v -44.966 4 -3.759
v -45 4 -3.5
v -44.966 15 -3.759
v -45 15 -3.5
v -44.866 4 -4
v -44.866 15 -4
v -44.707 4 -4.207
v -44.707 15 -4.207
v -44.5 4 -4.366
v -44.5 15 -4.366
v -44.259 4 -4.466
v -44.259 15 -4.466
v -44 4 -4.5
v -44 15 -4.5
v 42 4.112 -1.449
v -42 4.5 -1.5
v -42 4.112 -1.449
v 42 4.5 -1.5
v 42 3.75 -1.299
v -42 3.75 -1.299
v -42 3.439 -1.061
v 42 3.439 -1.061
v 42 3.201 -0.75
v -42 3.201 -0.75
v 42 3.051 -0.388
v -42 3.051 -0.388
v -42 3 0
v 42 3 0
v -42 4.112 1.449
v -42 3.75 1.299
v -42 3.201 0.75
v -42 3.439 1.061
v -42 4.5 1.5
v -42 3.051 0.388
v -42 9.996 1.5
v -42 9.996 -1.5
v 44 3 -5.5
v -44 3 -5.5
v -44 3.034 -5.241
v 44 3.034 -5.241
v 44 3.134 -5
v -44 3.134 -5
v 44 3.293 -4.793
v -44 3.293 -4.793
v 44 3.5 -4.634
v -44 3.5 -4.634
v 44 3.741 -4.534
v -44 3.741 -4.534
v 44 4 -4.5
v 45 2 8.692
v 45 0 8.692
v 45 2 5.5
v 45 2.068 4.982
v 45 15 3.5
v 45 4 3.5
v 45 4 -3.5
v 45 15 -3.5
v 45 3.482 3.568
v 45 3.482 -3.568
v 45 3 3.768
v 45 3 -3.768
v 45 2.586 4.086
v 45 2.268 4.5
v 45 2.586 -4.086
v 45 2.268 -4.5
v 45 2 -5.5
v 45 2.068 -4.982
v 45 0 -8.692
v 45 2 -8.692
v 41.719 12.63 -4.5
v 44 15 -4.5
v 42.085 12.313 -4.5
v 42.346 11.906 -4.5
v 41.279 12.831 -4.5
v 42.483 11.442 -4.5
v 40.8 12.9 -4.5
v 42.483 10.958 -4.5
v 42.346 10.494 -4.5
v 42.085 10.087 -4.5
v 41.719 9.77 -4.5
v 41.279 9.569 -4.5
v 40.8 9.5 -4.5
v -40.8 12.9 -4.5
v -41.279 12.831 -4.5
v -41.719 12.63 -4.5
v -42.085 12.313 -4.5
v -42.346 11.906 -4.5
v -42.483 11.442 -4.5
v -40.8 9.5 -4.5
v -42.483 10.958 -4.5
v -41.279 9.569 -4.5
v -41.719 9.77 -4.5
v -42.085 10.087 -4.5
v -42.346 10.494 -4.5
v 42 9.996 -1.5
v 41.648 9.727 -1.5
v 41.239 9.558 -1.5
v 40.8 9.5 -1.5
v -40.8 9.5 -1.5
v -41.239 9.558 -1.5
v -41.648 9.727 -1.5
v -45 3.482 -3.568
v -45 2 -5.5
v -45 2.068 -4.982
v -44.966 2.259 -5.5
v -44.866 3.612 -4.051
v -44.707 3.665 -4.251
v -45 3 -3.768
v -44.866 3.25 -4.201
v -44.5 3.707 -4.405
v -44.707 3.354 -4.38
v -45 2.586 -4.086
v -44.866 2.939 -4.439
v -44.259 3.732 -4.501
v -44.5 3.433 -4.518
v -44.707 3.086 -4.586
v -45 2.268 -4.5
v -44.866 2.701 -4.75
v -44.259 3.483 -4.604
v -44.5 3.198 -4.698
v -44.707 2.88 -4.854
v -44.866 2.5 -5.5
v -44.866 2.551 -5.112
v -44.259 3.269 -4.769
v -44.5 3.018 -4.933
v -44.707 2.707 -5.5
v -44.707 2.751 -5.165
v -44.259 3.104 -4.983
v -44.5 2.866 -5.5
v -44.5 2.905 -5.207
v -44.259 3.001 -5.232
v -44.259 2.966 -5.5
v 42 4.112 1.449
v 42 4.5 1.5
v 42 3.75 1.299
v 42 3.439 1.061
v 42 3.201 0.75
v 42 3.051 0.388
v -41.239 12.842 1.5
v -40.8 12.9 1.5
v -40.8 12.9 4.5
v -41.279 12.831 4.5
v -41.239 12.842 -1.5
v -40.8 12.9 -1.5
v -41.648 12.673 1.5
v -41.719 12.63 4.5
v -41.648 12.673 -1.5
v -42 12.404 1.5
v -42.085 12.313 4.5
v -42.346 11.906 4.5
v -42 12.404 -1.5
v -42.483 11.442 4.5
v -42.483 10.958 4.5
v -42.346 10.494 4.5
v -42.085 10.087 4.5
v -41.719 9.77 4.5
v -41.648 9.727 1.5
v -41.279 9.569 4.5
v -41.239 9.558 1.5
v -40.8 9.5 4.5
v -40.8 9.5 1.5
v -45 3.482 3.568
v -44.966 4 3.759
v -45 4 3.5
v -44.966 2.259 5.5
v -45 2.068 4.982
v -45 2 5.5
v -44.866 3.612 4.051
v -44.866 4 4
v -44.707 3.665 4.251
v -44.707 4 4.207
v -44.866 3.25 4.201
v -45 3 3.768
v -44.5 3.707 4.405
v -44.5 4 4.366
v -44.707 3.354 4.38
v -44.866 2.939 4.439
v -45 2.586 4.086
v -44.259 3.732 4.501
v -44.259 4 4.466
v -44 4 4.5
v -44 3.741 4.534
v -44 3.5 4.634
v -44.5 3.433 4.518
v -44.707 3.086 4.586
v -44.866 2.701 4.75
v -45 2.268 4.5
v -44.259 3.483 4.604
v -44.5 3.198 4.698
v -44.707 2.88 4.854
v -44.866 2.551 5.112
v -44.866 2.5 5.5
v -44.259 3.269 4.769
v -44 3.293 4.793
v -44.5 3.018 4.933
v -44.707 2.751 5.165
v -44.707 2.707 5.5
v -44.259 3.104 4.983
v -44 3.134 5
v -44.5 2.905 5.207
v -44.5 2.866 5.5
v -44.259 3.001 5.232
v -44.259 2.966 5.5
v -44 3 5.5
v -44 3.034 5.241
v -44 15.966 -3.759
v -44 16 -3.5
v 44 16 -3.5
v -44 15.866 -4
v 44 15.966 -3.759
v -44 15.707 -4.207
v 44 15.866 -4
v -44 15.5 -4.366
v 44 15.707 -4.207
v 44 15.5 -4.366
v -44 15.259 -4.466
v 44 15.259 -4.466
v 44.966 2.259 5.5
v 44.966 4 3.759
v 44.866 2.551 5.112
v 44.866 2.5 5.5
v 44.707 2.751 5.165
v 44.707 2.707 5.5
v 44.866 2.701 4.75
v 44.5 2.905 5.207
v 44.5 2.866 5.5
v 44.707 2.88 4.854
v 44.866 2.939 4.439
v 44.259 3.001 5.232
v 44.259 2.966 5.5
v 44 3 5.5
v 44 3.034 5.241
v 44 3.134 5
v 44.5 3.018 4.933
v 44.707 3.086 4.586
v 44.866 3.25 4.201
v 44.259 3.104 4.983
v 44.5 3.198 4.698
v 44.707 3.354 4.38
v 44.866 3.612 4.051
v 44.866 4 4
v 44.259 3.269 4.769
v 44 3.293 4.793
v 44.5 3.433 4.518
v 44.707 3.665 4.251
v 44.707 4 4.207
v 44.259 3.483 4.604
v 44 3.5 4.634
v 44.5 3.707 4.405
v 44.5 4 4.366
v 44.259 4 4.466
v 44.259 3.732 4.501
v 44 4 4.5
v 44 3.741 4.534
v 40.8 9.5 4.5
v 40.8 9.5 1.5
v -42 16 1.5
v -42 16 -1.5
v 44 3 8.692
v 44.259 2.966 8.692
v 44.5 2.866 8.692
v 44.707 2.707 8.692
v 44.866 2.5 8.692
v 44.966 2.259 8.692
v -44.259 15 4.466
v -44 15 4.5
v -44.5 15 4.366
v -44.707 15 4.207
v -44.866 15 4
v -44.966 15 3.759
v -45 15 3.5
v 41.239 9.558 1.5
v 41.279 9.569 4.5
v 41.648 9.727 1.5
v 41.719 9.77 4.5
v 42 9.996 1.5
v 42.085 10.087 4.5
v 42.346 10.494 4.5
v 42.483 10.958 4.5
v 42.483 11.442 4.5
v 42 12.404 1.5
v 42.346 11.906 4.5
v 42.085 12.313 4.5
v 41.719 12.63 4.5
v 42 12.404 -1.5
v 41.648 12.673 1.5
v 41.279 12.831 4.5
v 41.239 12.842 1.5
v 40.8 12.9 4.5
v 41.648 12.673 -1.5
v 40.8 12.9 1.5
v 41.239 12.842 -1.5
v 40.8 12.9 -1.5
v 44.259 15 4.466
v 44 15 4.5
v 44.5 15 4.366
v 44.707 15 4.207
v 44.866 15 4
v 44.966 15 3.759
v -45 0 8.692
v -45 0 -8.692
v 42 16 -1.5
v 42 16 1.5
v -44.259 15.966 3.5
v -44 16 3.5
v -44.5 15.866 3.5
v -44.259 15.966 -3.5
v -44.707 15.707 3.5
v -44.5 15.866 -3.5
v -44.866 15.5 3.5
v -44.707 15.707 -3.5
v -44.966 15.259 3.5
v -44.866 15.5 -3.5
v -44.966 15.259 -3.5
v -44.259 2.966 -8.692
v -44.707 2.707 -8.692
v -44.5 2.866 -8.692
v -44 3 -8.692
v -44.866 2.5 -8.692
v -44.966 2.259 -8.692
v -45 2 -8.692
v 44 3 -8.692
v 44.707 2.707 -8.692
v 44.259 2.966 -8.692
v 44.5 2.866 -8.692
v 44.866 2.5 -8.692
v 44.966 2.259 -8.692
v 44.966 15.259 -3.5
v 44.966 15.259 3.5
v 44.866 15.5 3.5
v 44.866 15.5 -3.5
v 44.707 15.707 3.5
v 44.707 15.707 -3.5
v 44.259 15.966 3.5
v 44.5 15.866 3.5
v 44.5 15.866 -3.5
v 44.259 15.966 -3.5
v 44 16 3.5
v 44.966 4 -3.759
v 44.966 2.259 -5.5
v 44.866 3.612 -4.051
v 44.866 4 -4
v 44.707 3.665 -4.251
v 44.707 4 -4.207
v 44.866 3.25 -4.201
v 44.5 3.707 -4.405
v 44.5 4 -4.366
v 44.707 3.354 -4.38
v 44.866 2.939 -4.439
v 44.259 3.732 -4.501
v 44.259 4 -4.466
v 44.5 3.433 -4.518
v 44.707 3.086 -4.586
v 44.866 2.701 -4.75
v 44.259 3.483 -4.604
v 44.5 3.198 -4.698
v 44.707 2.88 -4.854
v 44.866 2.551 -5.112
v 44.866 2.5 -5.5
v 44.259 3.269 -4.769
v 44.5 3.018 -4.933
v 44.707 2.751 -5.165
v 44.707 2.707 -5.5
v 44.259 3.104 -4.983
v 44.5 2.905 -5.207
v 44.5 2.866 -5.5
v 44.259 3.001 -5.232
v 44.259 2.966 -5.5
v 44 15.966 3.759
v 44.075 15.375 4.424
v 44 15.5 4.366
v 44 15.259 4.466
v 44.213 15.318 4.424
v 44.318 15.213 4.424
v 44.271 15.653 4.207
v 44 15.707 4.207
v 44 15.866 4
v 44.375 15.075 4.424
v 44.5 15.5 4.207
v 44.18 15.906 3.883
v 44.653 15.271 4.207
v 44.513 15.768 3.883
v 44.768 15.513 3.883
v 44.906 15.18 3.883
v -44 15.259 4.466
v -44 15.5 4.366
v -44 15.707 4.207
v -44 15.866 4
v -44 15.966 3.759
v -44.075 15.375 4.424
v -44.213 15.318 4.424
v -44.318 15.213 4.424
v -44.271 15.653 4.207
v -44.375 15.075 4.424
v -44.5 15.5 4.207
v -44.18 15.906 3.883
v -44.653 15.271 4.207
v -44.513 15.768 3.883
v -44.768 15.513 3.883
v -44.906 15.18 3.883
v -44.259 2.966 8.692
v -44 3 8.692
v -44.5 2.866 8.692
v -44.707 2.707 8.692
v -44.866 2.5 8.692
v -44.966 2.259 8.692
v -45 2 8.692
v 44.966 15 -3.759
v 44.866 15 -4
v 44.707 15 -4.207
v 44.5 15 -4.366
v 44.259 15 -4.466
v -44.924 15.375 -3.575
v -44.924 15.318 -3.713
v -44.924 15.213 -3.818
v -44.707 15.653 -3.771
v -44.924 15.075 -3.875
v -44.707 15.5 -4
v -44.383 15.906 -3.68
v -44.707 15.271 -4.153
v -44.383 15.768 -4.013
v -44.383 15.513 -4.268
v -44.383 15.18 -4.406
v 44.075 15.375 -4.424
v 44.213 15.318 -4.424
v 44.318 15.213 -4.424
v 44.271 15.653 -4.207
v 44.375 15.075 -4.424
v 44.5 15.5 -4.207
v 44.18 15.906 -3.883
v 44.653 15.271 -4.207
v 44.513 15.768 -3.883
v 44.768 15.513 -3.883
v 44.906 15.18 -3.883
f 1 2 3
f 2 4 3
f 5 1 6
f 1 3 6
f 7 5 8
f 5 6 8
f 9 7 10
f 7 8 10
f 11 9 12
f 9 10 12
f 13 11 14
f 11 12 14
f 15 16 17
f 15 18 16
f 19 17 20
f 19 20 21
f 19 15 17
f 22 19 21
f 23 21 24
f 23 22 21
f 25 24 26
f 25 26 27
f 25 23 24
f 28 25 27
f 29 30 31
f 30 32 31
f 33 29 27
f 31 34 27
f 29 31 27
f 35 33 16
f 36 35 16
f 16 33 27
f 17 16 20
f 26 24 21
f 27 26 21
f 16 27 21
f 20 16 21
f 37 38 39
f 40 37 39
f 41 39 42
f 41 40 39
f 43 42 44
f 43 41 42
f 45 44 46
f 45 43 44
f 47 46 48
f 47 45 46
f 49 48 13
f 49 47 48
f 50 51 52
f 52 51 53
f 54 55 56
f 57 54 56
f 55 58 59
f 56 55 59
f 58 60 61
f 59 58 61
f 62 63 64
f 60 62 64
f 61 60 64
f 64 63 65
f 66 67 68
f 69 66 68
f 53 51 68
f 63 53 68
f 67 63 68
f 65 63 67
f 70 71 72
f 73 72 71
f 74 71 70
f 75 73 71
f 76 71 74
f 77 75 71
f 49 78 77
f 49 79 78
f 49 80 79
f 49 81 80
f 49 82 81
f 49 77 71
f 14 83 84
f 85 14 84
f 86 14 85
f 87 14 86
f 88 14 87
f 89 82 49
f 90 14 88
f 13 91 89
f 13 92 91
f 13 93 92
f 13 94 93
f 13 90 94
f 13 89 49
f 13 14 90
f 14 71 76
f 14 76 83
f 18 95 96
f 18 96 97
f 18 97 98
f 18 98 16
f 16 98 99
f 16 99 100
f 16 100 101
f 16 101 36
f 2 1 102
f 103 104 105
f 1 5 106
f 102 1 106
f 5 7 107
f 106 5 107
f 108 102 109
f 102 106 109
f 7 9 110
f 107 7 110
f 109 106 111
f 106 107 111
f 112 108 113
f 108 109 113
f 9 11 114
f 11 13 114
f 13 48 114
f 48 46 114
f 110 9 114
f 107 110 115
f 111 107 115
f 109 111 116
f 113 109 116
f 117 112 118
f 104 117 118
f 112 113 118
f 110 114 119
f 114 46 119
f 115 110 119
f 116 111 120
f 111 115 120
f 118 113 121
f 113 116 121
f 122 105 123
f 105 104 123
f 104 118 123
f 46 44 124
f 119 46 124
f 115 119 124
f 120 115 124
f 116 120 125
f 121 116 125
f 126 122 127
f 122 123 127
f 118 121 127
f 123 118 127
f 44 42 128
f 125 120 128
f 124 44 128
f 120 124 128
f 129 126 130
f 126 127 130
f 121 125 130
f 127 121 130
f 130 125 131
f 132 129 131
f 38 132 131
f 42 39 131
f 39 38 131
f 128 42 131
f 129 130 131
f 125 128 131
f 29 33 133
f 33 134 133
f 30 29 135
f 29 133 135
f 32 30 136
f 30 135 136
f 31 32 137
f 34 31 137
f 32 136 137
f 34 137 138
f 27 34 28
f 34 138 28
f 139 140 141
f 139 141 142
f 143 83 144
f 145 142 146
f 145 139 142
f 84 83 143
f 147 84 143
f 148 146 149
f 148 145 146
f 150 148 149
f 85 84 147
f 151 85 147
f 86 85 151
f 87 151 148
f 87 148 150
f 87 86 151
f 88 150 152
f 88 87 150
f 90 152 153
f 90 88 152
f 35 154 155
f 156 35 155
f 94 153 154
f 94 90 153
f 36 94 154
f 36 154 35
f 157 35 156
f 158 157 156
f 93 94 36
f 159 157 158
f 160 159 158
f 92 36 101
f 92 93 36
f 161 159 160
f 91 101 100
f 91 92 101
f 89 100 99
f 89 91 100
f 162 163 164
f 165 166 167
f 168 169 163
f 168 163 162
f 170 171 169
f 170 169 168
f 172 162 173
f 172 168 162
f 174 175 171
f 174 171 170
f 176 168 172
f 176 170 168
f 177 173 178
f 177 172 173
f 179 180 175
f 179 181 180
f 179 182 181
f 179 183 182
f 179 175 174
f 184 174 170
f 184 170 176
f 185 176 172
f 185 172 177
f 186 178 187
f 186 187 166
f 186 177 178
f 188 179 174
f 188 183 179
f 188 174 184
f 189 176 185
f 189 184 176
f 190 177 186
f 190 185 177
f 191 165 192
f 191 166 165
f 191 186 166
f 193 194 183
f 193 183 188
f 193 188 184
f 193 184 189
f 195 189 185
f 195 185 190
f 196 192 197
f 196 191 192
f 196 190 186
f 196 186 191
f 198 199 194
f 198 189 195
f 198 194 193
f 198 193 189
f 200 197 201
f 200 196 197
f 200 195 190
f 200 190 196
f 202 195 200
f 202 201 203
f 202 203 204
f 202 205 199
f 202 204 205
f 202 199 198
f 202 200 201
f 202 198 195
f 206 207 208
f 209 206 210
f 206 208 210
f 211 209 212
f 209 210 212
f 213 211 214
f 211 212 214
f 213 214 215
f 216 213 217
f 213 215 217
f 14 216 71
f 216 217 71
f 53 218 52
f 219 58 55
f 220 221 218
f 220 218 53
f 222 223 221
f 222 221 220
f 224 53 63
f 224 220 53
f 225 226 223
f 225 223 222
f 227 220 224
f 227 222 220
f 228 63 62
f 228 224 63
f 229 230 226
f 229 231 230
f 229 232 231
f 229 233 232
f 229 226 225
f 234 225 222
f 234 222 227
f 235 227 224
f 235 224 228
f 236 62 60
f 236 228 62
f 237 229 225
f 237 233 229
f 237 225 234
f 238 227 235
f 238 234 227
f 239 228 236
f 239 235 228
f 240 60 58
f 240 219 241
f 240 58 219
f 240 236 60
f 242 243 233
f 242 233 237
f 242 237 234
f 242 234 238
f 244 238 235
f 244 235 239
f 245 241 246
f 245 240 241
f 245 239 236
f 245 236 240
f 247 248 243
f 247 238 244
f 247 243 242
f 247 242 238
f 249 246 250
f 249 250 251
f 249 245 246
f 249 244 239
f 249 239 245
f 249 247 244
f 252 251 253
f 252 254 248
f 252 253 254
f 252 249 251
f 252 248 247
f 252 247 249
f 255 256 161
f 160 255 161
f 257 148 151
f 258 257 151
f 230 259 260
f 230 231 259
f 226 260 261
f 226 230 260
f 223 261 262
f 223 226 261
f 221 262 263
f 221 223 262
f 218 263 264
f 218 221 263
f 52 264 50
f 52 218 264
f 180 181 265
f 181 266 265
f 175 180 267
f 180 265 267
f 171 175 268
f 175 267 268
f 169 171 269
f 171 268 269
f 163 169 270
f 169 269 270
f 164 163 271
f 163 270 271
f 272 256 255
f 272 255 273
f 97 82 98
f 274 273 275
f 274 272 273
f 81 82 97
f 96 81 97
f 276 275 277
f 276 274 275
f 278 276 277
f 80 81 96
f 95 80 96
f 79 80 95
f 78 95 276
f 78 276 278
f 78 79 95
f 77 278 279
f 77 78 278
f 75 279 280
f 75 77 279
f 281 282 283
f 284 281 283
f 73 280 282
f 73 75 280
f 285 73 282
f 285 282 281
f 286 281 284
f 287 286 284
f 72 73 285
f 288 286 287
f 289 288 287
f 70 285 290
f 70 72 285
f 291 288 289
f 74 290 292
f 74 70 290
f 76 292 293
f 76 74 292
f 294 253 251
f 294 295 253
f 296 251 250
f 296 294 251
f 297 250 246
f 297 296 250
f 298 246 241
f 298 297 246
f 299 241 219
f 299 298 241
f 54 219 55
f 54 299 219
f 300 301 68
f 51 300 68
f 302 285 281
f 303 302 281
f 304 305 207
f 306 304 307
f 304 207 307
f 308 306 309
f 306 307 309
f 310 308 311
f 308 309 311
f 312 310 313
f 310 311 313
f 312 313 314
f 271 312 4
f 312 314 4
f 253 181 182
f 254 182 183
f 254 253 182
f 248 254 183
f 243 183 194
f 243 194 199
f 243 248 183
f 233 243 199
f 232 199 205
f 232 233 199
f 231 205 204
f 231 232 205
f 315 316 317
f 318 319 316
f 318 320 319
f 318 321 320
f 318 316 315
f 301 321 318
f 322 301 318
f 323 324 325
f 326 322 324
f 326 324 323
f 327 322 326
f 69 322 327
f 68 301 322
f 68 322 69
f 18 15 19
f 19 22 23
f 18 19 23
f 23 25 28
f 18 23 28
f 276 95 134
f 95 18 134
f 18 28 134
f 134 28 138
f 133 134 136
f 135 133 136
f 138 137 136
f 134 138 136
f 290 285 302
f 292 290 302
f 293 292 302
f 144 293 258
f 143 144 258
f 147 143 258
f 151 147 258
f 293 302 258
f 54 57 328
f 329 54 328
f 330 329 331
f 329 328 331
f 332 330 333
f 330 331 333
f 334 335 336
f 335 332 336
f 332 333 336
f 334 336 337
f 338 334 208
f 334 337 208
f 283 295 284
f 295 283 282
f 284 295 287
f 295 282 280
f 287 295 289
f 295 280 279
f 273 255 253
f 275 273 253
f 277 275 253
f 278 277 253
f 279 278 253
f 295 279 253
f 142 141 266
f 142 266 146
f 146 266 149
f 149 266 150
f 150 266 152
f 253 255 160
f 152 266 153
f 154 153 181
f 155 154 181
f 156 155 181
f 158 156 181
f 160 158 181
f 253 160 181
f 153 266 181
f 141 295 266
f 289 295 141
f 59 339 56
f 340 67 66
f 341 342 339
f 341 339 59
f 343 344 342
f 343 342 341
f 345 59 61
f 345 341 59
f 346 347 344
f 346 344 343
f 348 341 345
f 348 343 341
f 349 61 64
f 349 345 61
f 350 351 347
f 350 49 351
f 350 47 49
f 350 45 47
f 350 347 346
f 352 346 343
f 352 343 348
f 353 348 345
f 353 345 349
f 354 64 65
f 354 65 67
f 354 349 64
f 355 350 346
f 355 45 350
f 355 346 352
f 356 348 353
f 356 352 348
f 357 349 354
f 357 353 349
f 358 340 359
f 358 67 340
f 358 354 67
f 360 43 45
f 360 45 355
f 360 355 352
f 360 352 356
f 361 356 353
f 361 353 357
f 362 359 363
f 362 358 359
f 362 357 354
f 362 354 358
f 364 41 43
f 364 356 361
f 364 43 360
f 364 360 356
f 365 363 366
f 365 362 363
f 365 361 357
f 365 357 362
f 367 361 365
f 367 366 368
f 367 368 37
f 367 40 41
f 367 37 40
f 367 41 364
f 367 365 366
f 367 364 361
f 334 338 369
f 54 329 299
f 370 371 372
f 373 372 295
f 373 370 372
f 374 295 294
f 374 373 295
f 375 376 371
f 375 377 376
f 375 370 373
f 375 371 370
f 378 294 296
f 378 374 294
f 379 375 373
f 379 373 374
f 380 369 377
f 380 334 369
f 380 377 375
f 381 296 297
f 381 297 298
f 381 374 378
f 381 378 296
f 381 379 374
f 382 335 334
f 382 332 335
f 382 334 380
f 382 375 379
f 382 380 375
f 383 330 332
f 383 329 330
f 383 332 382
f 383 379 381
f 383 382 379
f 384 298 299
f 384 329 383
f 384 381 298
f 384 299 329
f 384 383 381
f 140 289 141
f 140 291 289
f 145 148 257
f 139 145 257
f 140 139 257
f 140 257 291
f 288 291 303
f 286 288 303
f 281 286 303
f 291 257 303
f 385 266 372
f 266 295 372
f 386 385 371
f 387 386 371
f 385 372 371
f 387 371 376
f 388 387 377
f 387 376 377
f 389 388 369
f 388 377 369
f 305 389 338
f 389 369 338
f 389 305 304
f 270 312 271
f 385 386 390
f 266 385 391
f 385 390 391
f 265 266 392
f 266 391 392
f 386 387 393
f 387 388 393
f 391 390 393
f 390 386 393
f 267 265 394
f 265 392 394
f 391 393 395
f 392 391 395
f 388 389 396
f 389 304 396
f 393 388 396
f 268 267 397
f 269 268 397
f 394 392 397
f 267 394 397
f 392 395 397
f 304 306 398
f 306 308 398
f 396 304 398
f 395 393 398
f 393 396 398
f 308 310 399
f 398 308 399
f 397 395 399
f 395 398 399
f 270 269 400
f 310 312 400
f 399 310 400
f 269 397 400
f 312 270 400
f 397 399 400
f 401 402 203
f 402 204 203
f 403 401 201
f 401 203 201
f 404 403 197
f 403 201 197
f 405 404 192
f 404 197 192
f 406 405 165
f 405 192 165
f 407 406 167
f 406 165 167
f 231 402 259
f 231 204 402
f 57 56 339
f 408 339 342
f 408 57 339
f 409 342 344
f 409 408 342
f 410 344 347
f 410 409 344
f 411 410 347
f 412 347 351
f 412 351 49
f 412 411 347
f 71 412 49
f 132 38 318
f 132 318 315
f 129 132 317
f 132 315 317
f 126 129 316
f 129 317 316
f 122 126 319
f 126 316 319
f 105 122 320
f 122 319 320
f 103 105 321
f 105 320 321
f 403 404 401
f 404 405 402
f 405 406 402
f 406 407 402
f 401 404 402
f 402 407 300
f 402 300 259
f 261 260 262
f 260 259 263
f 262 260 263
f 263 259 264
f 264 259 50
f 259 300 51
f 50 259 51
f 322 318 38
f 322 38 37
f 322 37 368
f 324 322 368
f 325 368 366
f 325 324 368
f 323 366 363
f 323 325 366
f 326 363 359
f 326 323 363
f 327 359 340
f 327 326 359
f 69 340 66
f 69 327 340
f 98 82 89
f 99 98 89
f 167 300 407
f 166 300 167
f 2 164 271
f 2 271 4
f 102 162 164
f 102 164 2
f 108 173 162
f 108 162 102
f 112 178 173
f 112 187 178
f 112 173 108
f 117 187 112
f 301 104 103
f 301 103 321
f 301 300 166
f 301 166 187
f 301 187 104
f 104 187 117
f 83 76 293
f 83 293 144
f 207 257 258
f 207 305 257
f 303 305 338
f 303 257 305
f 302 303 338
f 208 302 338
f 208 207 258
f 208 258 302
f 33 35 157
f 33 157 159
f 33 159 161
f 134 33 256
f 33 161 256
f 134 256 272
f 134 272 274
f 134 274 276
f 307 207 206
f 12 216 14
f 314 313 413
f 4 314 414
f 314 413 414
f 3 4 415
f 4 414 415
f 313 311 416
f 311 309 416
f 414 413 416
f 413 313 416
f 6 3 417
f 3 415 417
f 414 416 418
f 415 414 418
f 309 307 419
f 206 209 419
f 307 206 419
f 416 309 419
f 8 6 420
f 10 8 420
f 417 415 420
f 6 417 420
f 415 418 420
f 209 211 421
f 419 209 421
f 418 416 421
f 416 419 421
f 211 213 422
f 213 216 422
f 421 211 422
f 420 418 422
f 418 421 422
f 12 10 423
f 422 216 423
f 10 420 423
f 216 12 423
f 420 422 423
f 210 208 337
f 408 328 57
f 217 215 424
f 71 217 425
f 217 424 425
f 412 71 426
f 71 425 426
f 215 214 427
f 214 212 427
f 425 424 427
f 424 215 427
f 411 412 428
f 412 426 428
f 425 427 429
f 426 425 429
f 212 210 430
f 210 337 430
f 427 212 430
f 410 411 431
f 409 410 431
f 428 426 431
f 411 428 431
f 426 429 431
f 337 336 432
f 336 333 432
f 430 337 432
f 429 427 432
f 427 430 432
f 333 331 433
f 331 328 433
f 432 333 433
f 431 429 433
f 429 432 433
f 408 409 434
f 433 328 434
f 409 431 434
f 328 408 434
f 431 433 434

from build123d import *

# Parameters (mm, degrees)
SKETCH2_W           = 90
SKETCH2_H           = 17.38310799
BOSS_EXTRUDE1_DEPTH = 3
SKETCH5_W           = 90
SKETCH5_H           = 9
SKETCH5_W_2         = 84
SKETCH5_H_2         = 3
BOSS_EXTRUDE2_DEPTH = 13
SKETCH6_W           = 85
SKETCH6_H           = 3.4
CUT_EXTRUDE1_DEPTH  = 50.548129095
FILLET1_R           = 1.5
FILLET4_R           = 1.7
FILLET5_R           = 1.7
FILLET8_R           = 1


# Some blends are built 0.0001 mm under size
with BuildPart() as part:
    # Sketch2 → Boss-Extrude1 (new body)
    with BuildSketch(Plane(origin=(0, 0, 0), x_dir=(1, 0, 0), z_dir=(0, 1, 0))):
        Rectangle(SKETCH2_W, SKETCH2_H)
    extrude(amount=BOSS_EXTRUDE1_DEPTH)

    # Sketch5 → Boss-Extrude2 (add)
    with BuildSketch(Plane(origin=(0, 3, 0), x_dir=(1, 0, 0), z_dir=(0, 1, 0))):
        Rectangle(SKETCH5_W, SKETCH5_H)
        Rectangle(SKETCH5_W_2, SKETCH5_H_2, mode=Mode.SUBTRACT)
    extrude(amount=BOSS_EXTRUDE2_DEPTH)

    # Sketch6 → Cut-Extrude1 (cut, through all)
    with BuildSketch(Plane(origin=(0, 0, -4.5), x_dir=(-1, 0, 0), z_dir=(0, 0, -1))):
        with Locations((0, 11.2)):
            Rectangle(SKETCH6_W, SKETCH6_H)
    extrude(amount=-CUT_EXTRUDE1_DEPTH, mode=Mode.SUBTRACT)

    # Fillet1
    fillet1_edges = [part.edges().sort_by_distance(p)[0] for p in [
        (0, 3, -1.5),
        (0, 3, 1.5),
    ]]
    fillet(fillet1_edges, radius=FILLET1_R - 0.0001)  # a hair under: the kernel refuses the full size

    # Fillet4
    # the kernel refuses this fillet: 1.7 mm, written as the material it adds along each edge
    with BuildSketch(Plane(origin=(42.5, 9.5, -4.5), x_dir=(-1, 0, 0), z_dir=(0, 0, 1))) as fillet4_piece_1_section:
        with BuildLine():
            CenterArc((FILLET4_R, -FILLET4_R), FILLET4_R, 90, 90)
            Line((0, -FILLET4_R), (0, 0))
            Line((0, 0), (FILLET4_R, 0))
        make_face()
    fillet4_piece_1 = extrude(amount=9, mode=Mode.PRIVATE)
    fillet4_piece_1 = split(fillet4_piece_1, bisect_by=Plane(origin=(41.653565017, 9.615018658, -1.5), z_dir=(0, 0, -1)), keep=Keep.TOP, mode=Mode.PRIVATE)
    fillet4_piece_1 = split(fillet4_piece_1, bisect_by=Plane(origin=(42, 9.615018658, -3), z_dir=(-1, 0, 0)), keep=Keep.TOP, mode=Mode.PRIVATE)
    add(fillet4_piece_1)
    with BuildSketch(Plane(origin=(42.5, 9.5, -4.5), x_dir=(-1, 0, 0), z_dir=(0, 0, 1))) as fillet4_piece_2_section:
        with BuildLine():
            CenterArc((FILLET4_R, -FILLET4_R), FILLET4_R, 90, 90)
            Line((0, -FILLET4_R), (0, 0))
            Line((0, 0), (FILLET4_R, 0))
        make_face()
    fillet4_piece_2 = extrude(amount=9, mode=Mode.PRIVATE)
    fillet4_piece_2 = split(fillet4_piece_2, bisect_by=Plane(origin=(42.31915671, 10.004156927, -1.5), z_dir=(0, 0, -1)), keep=Keep.TOP, mode=Mode.PRIVATE)
    fillet4_piece_2 = split(fillet4_piece_2, bisect_by=Plane(origin=(42, 10.004156927, -3), z_dir=(1, 0, 0)), keep=Keep.TOP, mode=Mode.PRIVATE)
    add(fillet4_piece_2)
    with BuildSketch(Plane(origin=(42.5, 9.5, -4.5), x_dir=(-1, 0, 0), z_dir=(0, 0, 1))) as fillet4_piece_3_section:
        with BuildLine():
            CenterArc((FILLET4_R, -FILLET4_R), FILLET4_R, 90, 90)
            Line((0, -FILLET4_R), (0, 0))
            Line((0, 0), (FILLET4_R, 0))
        make_face()
    fillet4_piece_3 = extrude(amount=9, mode=Mode.PRIVATE)
    fillet4_piece_3 = split(fillet4_piece_3, bisect_by=Plane(origin=(42.31915671, 10.004156927, -1.5), z_dir=(0, 0, 1)), keep=Keep.TOP, mode=Mode.PRIVATE)
    fillet4_piece_3 = split(fillet4_piece_3, bisect_by=Plane(origin=(42.31915671, 10.004156927, 1.5), z_dir=(0, 0, -1)), keep=Keep.TOP, mode=Mode.PRIVATE)
    fillet4_piece_3 = split(fillet4_piece_3, bisect_by=Plane(origin=(42, 10.004156927, 0), z_dir=(1, 0, 0)), keep=Keep.TOP, mode=Mode.PRIVATE)
    add(fillet4_piece_3)
    with BuildSketch(Plane(origin=(42.5, 9.5, -4.5), x_dir=(-1, 0, 0), z_dir=(0, 0, 1))) as fillet4_piece_4_section:
        with BuildLine():
            CenterArc((FILLET4_R, -FILLET4_R), FILLET4_R, 90, 90)
            Line((0, -FILLET4_R), (0, 0))
            Line((0, 0), (FILLET4_R, 0))
        make_face()
    fillet4_piece_4 = extrude(amount=9, mode=Mode.PRIVATE)
    fillet4_piece_4 = split(fillet4_piece_4, bisect_by=Plane(origin=(41.653565017, 9.615018658, 1.5), z_dir=(0, 0, 1)), keep=Keep.TOP, mode=Mode.PRIVATE)
    fillet4_piece_4 = split(fillet4_piece_4, bisect_by=Plane(origin=(42, 9.615018658, 3), z_dir=(-1, 0, 0)), keep=Keep.TOP, mode=Mode.PRIVATE)
    add(fillet4_piece_4)
    with BuildSketch(Plane(origin=(42.5, 9.5, -4.5), x_dir=(-1, 0, 0), z_dir=(0, 0, 1))) as fillet4_piece_5_section:
        with BuildLine():
            CenterArc((FILLET4_R, -FILLET4_R), FILLET4_R, 90, 90)
            Line((0, -FILLET4_R), (0, 0))
            Line((0, 0), (FILLET4_R, 0))
        make_face()
    fillet4_piece_5 = extrude(amount=9, mode=Mode.PRIVATE)
    fillet4_piece_5 = split(fillet4_piece_5, bisect_by=Plane(origin=(42.31915671, 10.004156927, 1.5), z_dir=(0, 0, 1)), keep=Keep.TOP, mode=Mode.PRIVATE)
    fillet4_piece_5 = split(fillet4_piece_5, bisect_by=Plane(origin=(42, 10.004156927, 3), z_dir=(1, 0, 0)), keep=Keep.TOP, mode=Mode.PRIVATE)
    add(fillet4_piece_5)
    with BuildSketch(Plane(origin=(42.5, 12.9, -4.5), x_dir=(0, -1, 0), z_dir=(0, 0, 1))) as fillet4_piece_6_section:
        with BuildLine():
            CenterArc((FILLET4_R, -FILLET4_R), FILLET4_R, 90, 90)
            Line((0, -FILLET4_R), (0, 0))
            Line((0, 0), (FILLET4_R, 0))
        make_face()
    fillet4_piece_6 = extrude(amount=9, mode=Mode.PRIVATE)
    fillet4_piece_6 = split(fillet4_piece_6, bisect_by=Plane(origin=(42.31915671, 12.395843073, -1.5), z_dir=(0, 0, -1)), keep=Keep.TOP, mode=Mode.PRIVATE)
    fillet4_piece_6 = split(fillet4_piece_6, bisect_by=Plane(origin=(42, 12.395843073, -3), z_dir=(1, 0, 0)), keep=Keep.TOP, mode=Mode.PRIVATE)
    add(fillet4_piece_6)
    with BuildSketch(Plane(origin=(42.5, 12.9, -4.5), x_dir=(0, -1, 0), z_dir=(0, 0, 1))) as fillet4_piece_7_section:
        with BuildLine():
            CenterArc((FILLET4_R, -FILLET4_R), FILLET4_R, 90, 90)
            Line((0, -FILLET4_R), (0, 0))
            Line((0, 0), (FILLET4_R, 0))
        make_face()
    fillet4_piece_7 = extrude(amount=9, mode=Mode.PRIVATE)
    fillet4_piece_7 = split(fillet4_piece_7, bisect_by=Plane(origin=(41.653565017, 12.784981342, -1.5), z_dir=(0, 0, -1)), keep=Keep.TOP, mode=Mode.PRIVATE)
    fillet4_piece_7 = split(fillet4_piece_7, bisect_by=Plane(origin=(42, 12.784981342, -3), z_dir=(-1, 0, 0)), keep=Keep.TOP, mode=Mode.PRIVATE)
    add(fillet4_piece_7)
    with BuildSketch(Plane(origin=(42.5, 12.9, -4.5), x_dir=(0, -1, 0), z_dir=(0, 0, 1))) as fillet4_piece_8_section:
        with BuildLine():
            CenterArc((FILLET4_R, -FILLET4_R), FILLET4_R, 90, 90)
            Line((0, -FILLET4_R), (0, 0))
            Line((0, 0), (FILLET4_R, 0))
        make_face()
    fillet4_piece_8 = extrude(amount=9, mode=Mode.PRIVATE)
    fillet4_piece_8 = split(fillet4_piece_8, bisect_by=Plane(origin=(42.31915671, 12.395843073, -1.5), z_dir=(0, 0, 1)), keep=Keep.TOP, mode=Mode.PRIVATE)
    fillet4_piece_8 = split(fillet4_piece_8, bisect_by=Plane(origin=(42, 12.395843073, 0), z_dir=(1, 0, 0)), keep=Keep.TOP, mode=Mode.PRIVATE)
    fillet4_piece_8 = split(fillet4_piece_8, bisect_by=Plane(origin=(42.31915671, 12.395843073, 1.5), z_dir=(0, 0, -1)), keep=Keep.TOP, mode=Mode.PRIVATE)
    add(fillet4_piece_8)
    with BuildSketch(Plane(origin=(42.5, 12.9, -4.5), x_dir=(0, -1, 0), z_dir=(0, 0, 1))) as fillet4_piece_9_section:
        with BuildLine():
            CenterArc((FILLET4_R, -FILLET4_R), FILLET4_R, 90, 90)
            Line((0, -FILLET4_R), (0, 0))
            Line((0, 0), (FILLET4_R, 0))
        make_face()
    fillet4_piece_9 = extrude(amount=9, mode=Mode.PRIVATE)
    fillet4_piece_9 = split(fillet4_piece_9, bisect_by=Plane(origin=(42, 12.395843073, 3), z_dir=(1, 0, 0)), keep=Keep.TOP, mode=Mode.PRIVATE)
    fillet4_piece_9 = split(fillet4_piece_9, bisect_by=Plane(origin=(42.31915671, 12.395843073, 1.5), z_dir=(0, 0, 1)), keep=Keep.TOP, mode=Mode.PRIVATE)
    add(fillet4_piece_9)
    with BuildSketch(Plane(origin=(42.5, 12.9, -4.5), x_dir=(0, -1, 0), z_dir=(0, 0, 1))) as fillet4_piece_10_section:
        with BuildLine():
            CenterArc((FILLET4_R, -FILLET4_R), FILLET4_R, 90, 90)
            Line((0, -FILLET4_R), (0, 0))
            Line((0, 0), (FILLET4_R, 0))
        make_face()
    fillet4_piece_10 = extrude(amount=9, mode=Mode.PRIVATE)
    fillet4_piece_10 = split(fillet4_piece_10, bisect_by=Plane(origin=(42, 12.784981342, 3), z_dir=(-1, 0, 0)), keep=Keep.TOP, mode=Mode.PRIVATE)
    fillet4_piece_10 = split(fillet4_piece_10, bisect_by=Plane(origin=(41.653565017, 12.784981342, 1.5), z_dir=(0, 0, 1)), keep=Keep.TOP, mode=Mode.PRIVATE)
    add(fillet4_piece_10)

    # Fillet5
    # the kernel refuses this fillet: 1.7 mm, written as the material it adds along each edge
    with BuildSketch(Plane(origin=(-42.5, 12.9, -4.5), x_dir=(0, -1, 0), z_dir=(0, 0, 1))) as fillet5_piece_1_section:
        with BuildLine():
            CenterArc((FILLET5_R, FILLET5_R), FILLET5_R, 180, 90)
            Line((0, FILLET5_R), (0, 0))
            Line((0, 0), (FILLET5_R, 0))
        make_face()
    fillet5_piece_1 = extrude(amount=9, mode=Mode.PRIVATE)
    fillet5_piece_1 = split(fillet5_piece_1, bisect_by=Plane(origin=(-42, 12.395843073, -3), z_dir=(-1, 0, 0)), keep=Keep.TOP, mode=Mode.PRIVATE)
    fillet5_piece_1 = split(fillet5_piece_1, bisect_by=Plane(origin=(-42.31915671, 12.395843073, -1.5), z_dir=(0, 0, -1)), keep=Keep.TOP, mode=Mode.PRIVATE)
    add(fillet5_piece_1)
    with BuildSketch(Plane(origin=(-42.5, 12.9, -4.5), x_dir=(0, -1, 0), z_dir=(0, 0, 1))) as fillet5_piece_2_section:
        with BuildLine():
            CenterArc((FILLET5_R, FILLET5_R), FILLET5_R, 180, 90)
            Line((0, FILLET5_R), (0, 0))
            Line((0, 0), (FILLET5_R, 0))
        make_face()
    fillet5_piece_2 = extrude(amount=9, mode=Mode.PRIVATE)
    fillet5_piece_2 = split(fillet5_piece_2, bisect_by=Plane(origin=(-42, 12.784981342, -3), z_dir=(1, 0, 0)), keep=Keep.TOP, mode=Mode.PRIVATE)
    fillet5_piece_2 = split(fillet5_piece_2, bisect_by=Plane(origin=(-41.653565017, 12.784981342, -1.5), z_dir=(0, 0, -1)), keep=Keep.TOP, mode=Mode.PRIVATE)
    add(fillet5_piece_2)
    with BuildSketch(Plane(origin=(-42.5, 12.9, -4.5), x_dir=(0, -1, 0), z_dir=(0, 0, 1))) as fillet5_piece_3_section:
        with BuildLine():
            CenterArc((FILLET5_R, FILLET5_R), FILLET5_R, 180, 90)
            Line((0, FILLET5_R), (0, 0))
            Line((0, 0), (FILLET5_R, 0))
        make_face()
    fillet5_piece_3 = extrude(amount=9, mode=Mode.PRIVATE)
    fillet5_piece_3 = split(fillet5_piece_3, bisect_by=Plane(origin=(-42, 12.395843073, 0), z_dir=(-1, 0, 0)), keep=Keep.TOP, mode=Mode.PRIVATE)
    fillet5_piece_3 = split(fillet5_piece_3, bisect_by=Plane(origin=(-42.31915671, 12.395843073, 1.5), z_dir=(0, 0, -1)), keep=Keep.TOP, mode=Mode.PRIVATE)
    fillet5_piece_3 = split(fillet5_piece_3, bisect_by=Plane(origin=(-42.31915671, 12.395843073, -1.5), z_dir=(0, 0, 1)), keep=Keep.TOP, mode=Mode.PRIVATE)
    add(fillet5_piece_3)
    with BuildSketch(Plane(origin=(-42.5, 12.9, -4.5), x_dir=(0, -1, 0), z_dir=(0, 0, 1))) as fillet5_piece_4_section:
        with BuildLine():
            CenterArc((FILLET5_R, FILLET5_R), FILLET5_R, 180, 90)
            Line((0, FILLET5_R), (0, 0))
            Line((0, 0), (FILLET5_R, 0))
        make_face()
    fillet5_piece_4 = extrude(amount=9, mode=Mode.PRIVATE)
    fillet5_piece_4 = split(fillet5_piece_4, bisect_by=Plane(origin=(-42, 12.395843073, 3), z_dir=(-1, 0, 0)), keep=Keep.TOP, mode=Mode.PRIVATE)
    fillet5_piece_4 = split(fillet5_piece_4, bisect_by=Plane(origin=(-42.31915671, 12.395843073, 1.5), z_dir=(0, 0, 1)), keep=Keep.TOP, mode=Mode.PRIVATE)
    add(fillet5_piece_4)
    with BuildSketch(Plane(origin=(-42.5, 12.9, -4.5), x_dir=(0, -1, 0), z_dir=(0, 0, 1))) as fillet5_piece_5_section:
        with BuildLine():
            CenterArc((FILLET5_R, FILLET5_R), FILLET5_R, 180, 90)
            Line((0, FILLET5_R), (0, 0))
            Line((0, 0), (FILLET5_R, 0))
        make_face()
    fillet5_piece_5 = extrude(amount=9, mode=Mode.PRIVATE)
    fillet5_piece_5 = split(fillet5_piece_5, bisect_by=Plane(origin=(-42, 12.784981342, 3), z_dir=(1, 0, 0)), keep=Keep.TOP, mode=Mode.PRIVATE)
    fillet5_piece_5 = split(fillet5_piece_5, bisect_by=Plane(origin=(-41.653565017, 12.784981342, 1.5), z_dir=(0, 0, 1)), keep=Keep.TOP, mode=Mode.PRIVATE)
    add(fillet5_piece_5)
    with BuildSketch(Plane(origin=(-42.5, 9.5, -4.5), x_dir=(0, 1, 0), z_dir=(0, 0, 1))) as fillet5_piece_6_section:
        with BuildLine():
            CenterArc((FILLET5_R, -FILLET5_R), FILLET5_R, 90, 90)
            Line((0, -FILLET5_R), (0, 0))
            Line((0, 0), (FILLET5_R, 0))
        make_face()
    fillet5_piece_6 = extrude(amount=9, mode=Mode.PRIVATE)
    fillet5_piece_6 = split(fillet5_piece_6, bisect_by=Plane(origin=(-42, 10.004156927, -3), z_dir=(-1, 0, 0)), keep=Keep.TOP, mode=Mode.PRIVATE)
    fillet5_piece_6 = split(fillet5_piece_6, bisect_by=Plane(origin=(-42.31915671, 10.004156927, -1.5), z_dir=(0, 0, -1)), keep=Keep.TOP, mode=Mode.PRIVATE)
    add(fillet5_piece_6)
    with BuildSketch(Plane(origin=(-42.5, 9.5, -4.5), x_dir=(0, 1, 0), z_dir=(0, 0, 1))) as fillet5_piece_7_section:
        with BuildLine():
            CenterArc((FILLET5_R, -FILLET5_R), FILLET5_R, 90, 90)
            Line((0, -FILLET5_R), (0, 0))
            Line((0, 0), (FILLET5_R, 0))
        make_face()
    fillet5_piece_7 = extrude(amount=9, mode=Mode.PRIVATE)
    fillet5_piece_7 = split(fillet5_piece_7, bisect_by=Plane(origin=(-42, 9.615018658, -3), z_dir=(1, 0, 0)), keep=Keep.TOP, mode=Mode.PRIVATE)
    fillet5_piece_7 = split(fillet5_piece_7, bisect_by=Plane(origin=(-41.653565017, 9.615018658, -1.5), z_dir=(0, 0, -1)), keep=Keep.TOP, mode=Mode.PRIVATE)
    add(fillet5_piece_7)
    with BuildSketch(Plane(origin=(-42.5, 9.5, -4.5), x_dir=(0, 1, 0), z_dir=(0, 0, 1))) as fillet5_piece_8_section:
        with BuildLine():
            CenterArc((FILLET5_R, -FILLET5_R), FILLET5_R, 90, 90)
            Line((0, -FILLET5_R), (0, 0))
            Line((0, 0), (FILLET5_R, 0))
        make_face()
    fillet5_piece_8 = extrude(amount=9, mode=Mode.PRIVATE)
    fillet5_piece_8 = split(fillet5_piece_8, bisect_by=Plane(origin=(-42.31915671, 10.004156927, 1.5), z_dir=(0, 0, -1)), keep=Keep.TOP, mode=Mode.PRIVATE)
    fillet5_piece_8 = split(fillet5_piece_8, bisect_by=Plane(origin=(-42, 10.004156927, 0), z_dir=(-1, 0, 0)), keep=Keep.TOP, mode=Mode.PRIVATE)
    fillet5_piece_8 = split(fillet5_piece_8, bisect_by=Plane(origin=(-42.31915671, 10.004156927, -1.5), z_dir=(0, 0, 1)), keep=Keep.TOP, mode=Mode.PRIVATE)
    add(fillet5_piece_8)
    with BuildSketch(Plane(origin=(-42.5, 9.5, -4.5), x_dir=(0, 1, 0), z_dir=(0, 0, 1))) as fillet5_piece_9_section:
        with BuildLine():
            CenterArc((FILLET5_R, -FILLET5_R), FILLET5_R, 90, 90)
            Line((0, -FILLET5_R), (0, 0))
            Line((0, 0), (FILLET5_R, 0))
        make_face()
    fillet5_piece_9 = extrude(amount=9, mode=Mode.PRIVATE)
    fillet5_piece_9 = split(fillet5_piece_9, bisect_by=Plane(origin=(-42.31915671, 10.004156927, 1.5), z_dir=(0, 0, 1)), keep=Keep.TOP, mode=Mode.PRIVATE)
    fillet5_piece_9 = split(fillet5_piece_9, bisect_by=Plane(origin=(-42, 10.004156927, 3), z_dir=(-1, 0, 0)), keep=Keep.TOP, mode=Mode.PRIVATE)
    add(fillet5_piece_9)
    with BuildSketch(Plane(origin=(-42.5, 9.5, -4.5), x_dir=(0, 1, 0), z_dir=(0, 0, 1))) as fillet5_piece_10_section:
        with BuildLine():
            CenterArc((FILLET5_R, -FILLET5_R), FILLET5_R, 90, 90)
            Line((0, -FILLET5_R), (0, 0))
            Line((0, 0), (FILLET5_R, 0))
        make_face()
    fillet5_piece_10 = extrude(amount=9, mode=Mode.PRIVATE)
    fillet5_piece_10 = split(fillet5_piece_10, bisect_by=Plane(origin=(-41.653565017, 9.615018658, 1.5), z_dir=(0, 0, 1)), keep=Keep.TOP, mode=Mode.PRIVATE)
    fillet5_piece_10 = split(fillet5_piece_10, bisect_by=Plane(origin=(-42, 9.615018658, 3), z_dir=(1, 0, 0)), keep=Keep.TOP, mode=Mode.PRIVATE)
    add(fillet5_piece_10)

    # Fillet8
    fillet8_edges = [part.edges().sort_by_distance(p)[0] for p in [
        (-45, 3, -6.595776997),
        (45, 3, -6.595776997),
        (-45, 3, 6.595776997),
        (45, 16, 0),
        (0, 16, -4.5),
        (-45, 16, 0),
        (0, 16, 4.5),
        (45, 9.5, 4.5),
        (0, 3, -4.5),
        (45, 9.5, -4.5),
        (-45, 9.5, -4.5),
        (0, 3, 4.5),
        (-45, 9.5, 4.5),
        (45, 3, 6.595776997),
    ]]
    fillet(fillet8_edges, radius=FILLET8_R)


solid = part.part
